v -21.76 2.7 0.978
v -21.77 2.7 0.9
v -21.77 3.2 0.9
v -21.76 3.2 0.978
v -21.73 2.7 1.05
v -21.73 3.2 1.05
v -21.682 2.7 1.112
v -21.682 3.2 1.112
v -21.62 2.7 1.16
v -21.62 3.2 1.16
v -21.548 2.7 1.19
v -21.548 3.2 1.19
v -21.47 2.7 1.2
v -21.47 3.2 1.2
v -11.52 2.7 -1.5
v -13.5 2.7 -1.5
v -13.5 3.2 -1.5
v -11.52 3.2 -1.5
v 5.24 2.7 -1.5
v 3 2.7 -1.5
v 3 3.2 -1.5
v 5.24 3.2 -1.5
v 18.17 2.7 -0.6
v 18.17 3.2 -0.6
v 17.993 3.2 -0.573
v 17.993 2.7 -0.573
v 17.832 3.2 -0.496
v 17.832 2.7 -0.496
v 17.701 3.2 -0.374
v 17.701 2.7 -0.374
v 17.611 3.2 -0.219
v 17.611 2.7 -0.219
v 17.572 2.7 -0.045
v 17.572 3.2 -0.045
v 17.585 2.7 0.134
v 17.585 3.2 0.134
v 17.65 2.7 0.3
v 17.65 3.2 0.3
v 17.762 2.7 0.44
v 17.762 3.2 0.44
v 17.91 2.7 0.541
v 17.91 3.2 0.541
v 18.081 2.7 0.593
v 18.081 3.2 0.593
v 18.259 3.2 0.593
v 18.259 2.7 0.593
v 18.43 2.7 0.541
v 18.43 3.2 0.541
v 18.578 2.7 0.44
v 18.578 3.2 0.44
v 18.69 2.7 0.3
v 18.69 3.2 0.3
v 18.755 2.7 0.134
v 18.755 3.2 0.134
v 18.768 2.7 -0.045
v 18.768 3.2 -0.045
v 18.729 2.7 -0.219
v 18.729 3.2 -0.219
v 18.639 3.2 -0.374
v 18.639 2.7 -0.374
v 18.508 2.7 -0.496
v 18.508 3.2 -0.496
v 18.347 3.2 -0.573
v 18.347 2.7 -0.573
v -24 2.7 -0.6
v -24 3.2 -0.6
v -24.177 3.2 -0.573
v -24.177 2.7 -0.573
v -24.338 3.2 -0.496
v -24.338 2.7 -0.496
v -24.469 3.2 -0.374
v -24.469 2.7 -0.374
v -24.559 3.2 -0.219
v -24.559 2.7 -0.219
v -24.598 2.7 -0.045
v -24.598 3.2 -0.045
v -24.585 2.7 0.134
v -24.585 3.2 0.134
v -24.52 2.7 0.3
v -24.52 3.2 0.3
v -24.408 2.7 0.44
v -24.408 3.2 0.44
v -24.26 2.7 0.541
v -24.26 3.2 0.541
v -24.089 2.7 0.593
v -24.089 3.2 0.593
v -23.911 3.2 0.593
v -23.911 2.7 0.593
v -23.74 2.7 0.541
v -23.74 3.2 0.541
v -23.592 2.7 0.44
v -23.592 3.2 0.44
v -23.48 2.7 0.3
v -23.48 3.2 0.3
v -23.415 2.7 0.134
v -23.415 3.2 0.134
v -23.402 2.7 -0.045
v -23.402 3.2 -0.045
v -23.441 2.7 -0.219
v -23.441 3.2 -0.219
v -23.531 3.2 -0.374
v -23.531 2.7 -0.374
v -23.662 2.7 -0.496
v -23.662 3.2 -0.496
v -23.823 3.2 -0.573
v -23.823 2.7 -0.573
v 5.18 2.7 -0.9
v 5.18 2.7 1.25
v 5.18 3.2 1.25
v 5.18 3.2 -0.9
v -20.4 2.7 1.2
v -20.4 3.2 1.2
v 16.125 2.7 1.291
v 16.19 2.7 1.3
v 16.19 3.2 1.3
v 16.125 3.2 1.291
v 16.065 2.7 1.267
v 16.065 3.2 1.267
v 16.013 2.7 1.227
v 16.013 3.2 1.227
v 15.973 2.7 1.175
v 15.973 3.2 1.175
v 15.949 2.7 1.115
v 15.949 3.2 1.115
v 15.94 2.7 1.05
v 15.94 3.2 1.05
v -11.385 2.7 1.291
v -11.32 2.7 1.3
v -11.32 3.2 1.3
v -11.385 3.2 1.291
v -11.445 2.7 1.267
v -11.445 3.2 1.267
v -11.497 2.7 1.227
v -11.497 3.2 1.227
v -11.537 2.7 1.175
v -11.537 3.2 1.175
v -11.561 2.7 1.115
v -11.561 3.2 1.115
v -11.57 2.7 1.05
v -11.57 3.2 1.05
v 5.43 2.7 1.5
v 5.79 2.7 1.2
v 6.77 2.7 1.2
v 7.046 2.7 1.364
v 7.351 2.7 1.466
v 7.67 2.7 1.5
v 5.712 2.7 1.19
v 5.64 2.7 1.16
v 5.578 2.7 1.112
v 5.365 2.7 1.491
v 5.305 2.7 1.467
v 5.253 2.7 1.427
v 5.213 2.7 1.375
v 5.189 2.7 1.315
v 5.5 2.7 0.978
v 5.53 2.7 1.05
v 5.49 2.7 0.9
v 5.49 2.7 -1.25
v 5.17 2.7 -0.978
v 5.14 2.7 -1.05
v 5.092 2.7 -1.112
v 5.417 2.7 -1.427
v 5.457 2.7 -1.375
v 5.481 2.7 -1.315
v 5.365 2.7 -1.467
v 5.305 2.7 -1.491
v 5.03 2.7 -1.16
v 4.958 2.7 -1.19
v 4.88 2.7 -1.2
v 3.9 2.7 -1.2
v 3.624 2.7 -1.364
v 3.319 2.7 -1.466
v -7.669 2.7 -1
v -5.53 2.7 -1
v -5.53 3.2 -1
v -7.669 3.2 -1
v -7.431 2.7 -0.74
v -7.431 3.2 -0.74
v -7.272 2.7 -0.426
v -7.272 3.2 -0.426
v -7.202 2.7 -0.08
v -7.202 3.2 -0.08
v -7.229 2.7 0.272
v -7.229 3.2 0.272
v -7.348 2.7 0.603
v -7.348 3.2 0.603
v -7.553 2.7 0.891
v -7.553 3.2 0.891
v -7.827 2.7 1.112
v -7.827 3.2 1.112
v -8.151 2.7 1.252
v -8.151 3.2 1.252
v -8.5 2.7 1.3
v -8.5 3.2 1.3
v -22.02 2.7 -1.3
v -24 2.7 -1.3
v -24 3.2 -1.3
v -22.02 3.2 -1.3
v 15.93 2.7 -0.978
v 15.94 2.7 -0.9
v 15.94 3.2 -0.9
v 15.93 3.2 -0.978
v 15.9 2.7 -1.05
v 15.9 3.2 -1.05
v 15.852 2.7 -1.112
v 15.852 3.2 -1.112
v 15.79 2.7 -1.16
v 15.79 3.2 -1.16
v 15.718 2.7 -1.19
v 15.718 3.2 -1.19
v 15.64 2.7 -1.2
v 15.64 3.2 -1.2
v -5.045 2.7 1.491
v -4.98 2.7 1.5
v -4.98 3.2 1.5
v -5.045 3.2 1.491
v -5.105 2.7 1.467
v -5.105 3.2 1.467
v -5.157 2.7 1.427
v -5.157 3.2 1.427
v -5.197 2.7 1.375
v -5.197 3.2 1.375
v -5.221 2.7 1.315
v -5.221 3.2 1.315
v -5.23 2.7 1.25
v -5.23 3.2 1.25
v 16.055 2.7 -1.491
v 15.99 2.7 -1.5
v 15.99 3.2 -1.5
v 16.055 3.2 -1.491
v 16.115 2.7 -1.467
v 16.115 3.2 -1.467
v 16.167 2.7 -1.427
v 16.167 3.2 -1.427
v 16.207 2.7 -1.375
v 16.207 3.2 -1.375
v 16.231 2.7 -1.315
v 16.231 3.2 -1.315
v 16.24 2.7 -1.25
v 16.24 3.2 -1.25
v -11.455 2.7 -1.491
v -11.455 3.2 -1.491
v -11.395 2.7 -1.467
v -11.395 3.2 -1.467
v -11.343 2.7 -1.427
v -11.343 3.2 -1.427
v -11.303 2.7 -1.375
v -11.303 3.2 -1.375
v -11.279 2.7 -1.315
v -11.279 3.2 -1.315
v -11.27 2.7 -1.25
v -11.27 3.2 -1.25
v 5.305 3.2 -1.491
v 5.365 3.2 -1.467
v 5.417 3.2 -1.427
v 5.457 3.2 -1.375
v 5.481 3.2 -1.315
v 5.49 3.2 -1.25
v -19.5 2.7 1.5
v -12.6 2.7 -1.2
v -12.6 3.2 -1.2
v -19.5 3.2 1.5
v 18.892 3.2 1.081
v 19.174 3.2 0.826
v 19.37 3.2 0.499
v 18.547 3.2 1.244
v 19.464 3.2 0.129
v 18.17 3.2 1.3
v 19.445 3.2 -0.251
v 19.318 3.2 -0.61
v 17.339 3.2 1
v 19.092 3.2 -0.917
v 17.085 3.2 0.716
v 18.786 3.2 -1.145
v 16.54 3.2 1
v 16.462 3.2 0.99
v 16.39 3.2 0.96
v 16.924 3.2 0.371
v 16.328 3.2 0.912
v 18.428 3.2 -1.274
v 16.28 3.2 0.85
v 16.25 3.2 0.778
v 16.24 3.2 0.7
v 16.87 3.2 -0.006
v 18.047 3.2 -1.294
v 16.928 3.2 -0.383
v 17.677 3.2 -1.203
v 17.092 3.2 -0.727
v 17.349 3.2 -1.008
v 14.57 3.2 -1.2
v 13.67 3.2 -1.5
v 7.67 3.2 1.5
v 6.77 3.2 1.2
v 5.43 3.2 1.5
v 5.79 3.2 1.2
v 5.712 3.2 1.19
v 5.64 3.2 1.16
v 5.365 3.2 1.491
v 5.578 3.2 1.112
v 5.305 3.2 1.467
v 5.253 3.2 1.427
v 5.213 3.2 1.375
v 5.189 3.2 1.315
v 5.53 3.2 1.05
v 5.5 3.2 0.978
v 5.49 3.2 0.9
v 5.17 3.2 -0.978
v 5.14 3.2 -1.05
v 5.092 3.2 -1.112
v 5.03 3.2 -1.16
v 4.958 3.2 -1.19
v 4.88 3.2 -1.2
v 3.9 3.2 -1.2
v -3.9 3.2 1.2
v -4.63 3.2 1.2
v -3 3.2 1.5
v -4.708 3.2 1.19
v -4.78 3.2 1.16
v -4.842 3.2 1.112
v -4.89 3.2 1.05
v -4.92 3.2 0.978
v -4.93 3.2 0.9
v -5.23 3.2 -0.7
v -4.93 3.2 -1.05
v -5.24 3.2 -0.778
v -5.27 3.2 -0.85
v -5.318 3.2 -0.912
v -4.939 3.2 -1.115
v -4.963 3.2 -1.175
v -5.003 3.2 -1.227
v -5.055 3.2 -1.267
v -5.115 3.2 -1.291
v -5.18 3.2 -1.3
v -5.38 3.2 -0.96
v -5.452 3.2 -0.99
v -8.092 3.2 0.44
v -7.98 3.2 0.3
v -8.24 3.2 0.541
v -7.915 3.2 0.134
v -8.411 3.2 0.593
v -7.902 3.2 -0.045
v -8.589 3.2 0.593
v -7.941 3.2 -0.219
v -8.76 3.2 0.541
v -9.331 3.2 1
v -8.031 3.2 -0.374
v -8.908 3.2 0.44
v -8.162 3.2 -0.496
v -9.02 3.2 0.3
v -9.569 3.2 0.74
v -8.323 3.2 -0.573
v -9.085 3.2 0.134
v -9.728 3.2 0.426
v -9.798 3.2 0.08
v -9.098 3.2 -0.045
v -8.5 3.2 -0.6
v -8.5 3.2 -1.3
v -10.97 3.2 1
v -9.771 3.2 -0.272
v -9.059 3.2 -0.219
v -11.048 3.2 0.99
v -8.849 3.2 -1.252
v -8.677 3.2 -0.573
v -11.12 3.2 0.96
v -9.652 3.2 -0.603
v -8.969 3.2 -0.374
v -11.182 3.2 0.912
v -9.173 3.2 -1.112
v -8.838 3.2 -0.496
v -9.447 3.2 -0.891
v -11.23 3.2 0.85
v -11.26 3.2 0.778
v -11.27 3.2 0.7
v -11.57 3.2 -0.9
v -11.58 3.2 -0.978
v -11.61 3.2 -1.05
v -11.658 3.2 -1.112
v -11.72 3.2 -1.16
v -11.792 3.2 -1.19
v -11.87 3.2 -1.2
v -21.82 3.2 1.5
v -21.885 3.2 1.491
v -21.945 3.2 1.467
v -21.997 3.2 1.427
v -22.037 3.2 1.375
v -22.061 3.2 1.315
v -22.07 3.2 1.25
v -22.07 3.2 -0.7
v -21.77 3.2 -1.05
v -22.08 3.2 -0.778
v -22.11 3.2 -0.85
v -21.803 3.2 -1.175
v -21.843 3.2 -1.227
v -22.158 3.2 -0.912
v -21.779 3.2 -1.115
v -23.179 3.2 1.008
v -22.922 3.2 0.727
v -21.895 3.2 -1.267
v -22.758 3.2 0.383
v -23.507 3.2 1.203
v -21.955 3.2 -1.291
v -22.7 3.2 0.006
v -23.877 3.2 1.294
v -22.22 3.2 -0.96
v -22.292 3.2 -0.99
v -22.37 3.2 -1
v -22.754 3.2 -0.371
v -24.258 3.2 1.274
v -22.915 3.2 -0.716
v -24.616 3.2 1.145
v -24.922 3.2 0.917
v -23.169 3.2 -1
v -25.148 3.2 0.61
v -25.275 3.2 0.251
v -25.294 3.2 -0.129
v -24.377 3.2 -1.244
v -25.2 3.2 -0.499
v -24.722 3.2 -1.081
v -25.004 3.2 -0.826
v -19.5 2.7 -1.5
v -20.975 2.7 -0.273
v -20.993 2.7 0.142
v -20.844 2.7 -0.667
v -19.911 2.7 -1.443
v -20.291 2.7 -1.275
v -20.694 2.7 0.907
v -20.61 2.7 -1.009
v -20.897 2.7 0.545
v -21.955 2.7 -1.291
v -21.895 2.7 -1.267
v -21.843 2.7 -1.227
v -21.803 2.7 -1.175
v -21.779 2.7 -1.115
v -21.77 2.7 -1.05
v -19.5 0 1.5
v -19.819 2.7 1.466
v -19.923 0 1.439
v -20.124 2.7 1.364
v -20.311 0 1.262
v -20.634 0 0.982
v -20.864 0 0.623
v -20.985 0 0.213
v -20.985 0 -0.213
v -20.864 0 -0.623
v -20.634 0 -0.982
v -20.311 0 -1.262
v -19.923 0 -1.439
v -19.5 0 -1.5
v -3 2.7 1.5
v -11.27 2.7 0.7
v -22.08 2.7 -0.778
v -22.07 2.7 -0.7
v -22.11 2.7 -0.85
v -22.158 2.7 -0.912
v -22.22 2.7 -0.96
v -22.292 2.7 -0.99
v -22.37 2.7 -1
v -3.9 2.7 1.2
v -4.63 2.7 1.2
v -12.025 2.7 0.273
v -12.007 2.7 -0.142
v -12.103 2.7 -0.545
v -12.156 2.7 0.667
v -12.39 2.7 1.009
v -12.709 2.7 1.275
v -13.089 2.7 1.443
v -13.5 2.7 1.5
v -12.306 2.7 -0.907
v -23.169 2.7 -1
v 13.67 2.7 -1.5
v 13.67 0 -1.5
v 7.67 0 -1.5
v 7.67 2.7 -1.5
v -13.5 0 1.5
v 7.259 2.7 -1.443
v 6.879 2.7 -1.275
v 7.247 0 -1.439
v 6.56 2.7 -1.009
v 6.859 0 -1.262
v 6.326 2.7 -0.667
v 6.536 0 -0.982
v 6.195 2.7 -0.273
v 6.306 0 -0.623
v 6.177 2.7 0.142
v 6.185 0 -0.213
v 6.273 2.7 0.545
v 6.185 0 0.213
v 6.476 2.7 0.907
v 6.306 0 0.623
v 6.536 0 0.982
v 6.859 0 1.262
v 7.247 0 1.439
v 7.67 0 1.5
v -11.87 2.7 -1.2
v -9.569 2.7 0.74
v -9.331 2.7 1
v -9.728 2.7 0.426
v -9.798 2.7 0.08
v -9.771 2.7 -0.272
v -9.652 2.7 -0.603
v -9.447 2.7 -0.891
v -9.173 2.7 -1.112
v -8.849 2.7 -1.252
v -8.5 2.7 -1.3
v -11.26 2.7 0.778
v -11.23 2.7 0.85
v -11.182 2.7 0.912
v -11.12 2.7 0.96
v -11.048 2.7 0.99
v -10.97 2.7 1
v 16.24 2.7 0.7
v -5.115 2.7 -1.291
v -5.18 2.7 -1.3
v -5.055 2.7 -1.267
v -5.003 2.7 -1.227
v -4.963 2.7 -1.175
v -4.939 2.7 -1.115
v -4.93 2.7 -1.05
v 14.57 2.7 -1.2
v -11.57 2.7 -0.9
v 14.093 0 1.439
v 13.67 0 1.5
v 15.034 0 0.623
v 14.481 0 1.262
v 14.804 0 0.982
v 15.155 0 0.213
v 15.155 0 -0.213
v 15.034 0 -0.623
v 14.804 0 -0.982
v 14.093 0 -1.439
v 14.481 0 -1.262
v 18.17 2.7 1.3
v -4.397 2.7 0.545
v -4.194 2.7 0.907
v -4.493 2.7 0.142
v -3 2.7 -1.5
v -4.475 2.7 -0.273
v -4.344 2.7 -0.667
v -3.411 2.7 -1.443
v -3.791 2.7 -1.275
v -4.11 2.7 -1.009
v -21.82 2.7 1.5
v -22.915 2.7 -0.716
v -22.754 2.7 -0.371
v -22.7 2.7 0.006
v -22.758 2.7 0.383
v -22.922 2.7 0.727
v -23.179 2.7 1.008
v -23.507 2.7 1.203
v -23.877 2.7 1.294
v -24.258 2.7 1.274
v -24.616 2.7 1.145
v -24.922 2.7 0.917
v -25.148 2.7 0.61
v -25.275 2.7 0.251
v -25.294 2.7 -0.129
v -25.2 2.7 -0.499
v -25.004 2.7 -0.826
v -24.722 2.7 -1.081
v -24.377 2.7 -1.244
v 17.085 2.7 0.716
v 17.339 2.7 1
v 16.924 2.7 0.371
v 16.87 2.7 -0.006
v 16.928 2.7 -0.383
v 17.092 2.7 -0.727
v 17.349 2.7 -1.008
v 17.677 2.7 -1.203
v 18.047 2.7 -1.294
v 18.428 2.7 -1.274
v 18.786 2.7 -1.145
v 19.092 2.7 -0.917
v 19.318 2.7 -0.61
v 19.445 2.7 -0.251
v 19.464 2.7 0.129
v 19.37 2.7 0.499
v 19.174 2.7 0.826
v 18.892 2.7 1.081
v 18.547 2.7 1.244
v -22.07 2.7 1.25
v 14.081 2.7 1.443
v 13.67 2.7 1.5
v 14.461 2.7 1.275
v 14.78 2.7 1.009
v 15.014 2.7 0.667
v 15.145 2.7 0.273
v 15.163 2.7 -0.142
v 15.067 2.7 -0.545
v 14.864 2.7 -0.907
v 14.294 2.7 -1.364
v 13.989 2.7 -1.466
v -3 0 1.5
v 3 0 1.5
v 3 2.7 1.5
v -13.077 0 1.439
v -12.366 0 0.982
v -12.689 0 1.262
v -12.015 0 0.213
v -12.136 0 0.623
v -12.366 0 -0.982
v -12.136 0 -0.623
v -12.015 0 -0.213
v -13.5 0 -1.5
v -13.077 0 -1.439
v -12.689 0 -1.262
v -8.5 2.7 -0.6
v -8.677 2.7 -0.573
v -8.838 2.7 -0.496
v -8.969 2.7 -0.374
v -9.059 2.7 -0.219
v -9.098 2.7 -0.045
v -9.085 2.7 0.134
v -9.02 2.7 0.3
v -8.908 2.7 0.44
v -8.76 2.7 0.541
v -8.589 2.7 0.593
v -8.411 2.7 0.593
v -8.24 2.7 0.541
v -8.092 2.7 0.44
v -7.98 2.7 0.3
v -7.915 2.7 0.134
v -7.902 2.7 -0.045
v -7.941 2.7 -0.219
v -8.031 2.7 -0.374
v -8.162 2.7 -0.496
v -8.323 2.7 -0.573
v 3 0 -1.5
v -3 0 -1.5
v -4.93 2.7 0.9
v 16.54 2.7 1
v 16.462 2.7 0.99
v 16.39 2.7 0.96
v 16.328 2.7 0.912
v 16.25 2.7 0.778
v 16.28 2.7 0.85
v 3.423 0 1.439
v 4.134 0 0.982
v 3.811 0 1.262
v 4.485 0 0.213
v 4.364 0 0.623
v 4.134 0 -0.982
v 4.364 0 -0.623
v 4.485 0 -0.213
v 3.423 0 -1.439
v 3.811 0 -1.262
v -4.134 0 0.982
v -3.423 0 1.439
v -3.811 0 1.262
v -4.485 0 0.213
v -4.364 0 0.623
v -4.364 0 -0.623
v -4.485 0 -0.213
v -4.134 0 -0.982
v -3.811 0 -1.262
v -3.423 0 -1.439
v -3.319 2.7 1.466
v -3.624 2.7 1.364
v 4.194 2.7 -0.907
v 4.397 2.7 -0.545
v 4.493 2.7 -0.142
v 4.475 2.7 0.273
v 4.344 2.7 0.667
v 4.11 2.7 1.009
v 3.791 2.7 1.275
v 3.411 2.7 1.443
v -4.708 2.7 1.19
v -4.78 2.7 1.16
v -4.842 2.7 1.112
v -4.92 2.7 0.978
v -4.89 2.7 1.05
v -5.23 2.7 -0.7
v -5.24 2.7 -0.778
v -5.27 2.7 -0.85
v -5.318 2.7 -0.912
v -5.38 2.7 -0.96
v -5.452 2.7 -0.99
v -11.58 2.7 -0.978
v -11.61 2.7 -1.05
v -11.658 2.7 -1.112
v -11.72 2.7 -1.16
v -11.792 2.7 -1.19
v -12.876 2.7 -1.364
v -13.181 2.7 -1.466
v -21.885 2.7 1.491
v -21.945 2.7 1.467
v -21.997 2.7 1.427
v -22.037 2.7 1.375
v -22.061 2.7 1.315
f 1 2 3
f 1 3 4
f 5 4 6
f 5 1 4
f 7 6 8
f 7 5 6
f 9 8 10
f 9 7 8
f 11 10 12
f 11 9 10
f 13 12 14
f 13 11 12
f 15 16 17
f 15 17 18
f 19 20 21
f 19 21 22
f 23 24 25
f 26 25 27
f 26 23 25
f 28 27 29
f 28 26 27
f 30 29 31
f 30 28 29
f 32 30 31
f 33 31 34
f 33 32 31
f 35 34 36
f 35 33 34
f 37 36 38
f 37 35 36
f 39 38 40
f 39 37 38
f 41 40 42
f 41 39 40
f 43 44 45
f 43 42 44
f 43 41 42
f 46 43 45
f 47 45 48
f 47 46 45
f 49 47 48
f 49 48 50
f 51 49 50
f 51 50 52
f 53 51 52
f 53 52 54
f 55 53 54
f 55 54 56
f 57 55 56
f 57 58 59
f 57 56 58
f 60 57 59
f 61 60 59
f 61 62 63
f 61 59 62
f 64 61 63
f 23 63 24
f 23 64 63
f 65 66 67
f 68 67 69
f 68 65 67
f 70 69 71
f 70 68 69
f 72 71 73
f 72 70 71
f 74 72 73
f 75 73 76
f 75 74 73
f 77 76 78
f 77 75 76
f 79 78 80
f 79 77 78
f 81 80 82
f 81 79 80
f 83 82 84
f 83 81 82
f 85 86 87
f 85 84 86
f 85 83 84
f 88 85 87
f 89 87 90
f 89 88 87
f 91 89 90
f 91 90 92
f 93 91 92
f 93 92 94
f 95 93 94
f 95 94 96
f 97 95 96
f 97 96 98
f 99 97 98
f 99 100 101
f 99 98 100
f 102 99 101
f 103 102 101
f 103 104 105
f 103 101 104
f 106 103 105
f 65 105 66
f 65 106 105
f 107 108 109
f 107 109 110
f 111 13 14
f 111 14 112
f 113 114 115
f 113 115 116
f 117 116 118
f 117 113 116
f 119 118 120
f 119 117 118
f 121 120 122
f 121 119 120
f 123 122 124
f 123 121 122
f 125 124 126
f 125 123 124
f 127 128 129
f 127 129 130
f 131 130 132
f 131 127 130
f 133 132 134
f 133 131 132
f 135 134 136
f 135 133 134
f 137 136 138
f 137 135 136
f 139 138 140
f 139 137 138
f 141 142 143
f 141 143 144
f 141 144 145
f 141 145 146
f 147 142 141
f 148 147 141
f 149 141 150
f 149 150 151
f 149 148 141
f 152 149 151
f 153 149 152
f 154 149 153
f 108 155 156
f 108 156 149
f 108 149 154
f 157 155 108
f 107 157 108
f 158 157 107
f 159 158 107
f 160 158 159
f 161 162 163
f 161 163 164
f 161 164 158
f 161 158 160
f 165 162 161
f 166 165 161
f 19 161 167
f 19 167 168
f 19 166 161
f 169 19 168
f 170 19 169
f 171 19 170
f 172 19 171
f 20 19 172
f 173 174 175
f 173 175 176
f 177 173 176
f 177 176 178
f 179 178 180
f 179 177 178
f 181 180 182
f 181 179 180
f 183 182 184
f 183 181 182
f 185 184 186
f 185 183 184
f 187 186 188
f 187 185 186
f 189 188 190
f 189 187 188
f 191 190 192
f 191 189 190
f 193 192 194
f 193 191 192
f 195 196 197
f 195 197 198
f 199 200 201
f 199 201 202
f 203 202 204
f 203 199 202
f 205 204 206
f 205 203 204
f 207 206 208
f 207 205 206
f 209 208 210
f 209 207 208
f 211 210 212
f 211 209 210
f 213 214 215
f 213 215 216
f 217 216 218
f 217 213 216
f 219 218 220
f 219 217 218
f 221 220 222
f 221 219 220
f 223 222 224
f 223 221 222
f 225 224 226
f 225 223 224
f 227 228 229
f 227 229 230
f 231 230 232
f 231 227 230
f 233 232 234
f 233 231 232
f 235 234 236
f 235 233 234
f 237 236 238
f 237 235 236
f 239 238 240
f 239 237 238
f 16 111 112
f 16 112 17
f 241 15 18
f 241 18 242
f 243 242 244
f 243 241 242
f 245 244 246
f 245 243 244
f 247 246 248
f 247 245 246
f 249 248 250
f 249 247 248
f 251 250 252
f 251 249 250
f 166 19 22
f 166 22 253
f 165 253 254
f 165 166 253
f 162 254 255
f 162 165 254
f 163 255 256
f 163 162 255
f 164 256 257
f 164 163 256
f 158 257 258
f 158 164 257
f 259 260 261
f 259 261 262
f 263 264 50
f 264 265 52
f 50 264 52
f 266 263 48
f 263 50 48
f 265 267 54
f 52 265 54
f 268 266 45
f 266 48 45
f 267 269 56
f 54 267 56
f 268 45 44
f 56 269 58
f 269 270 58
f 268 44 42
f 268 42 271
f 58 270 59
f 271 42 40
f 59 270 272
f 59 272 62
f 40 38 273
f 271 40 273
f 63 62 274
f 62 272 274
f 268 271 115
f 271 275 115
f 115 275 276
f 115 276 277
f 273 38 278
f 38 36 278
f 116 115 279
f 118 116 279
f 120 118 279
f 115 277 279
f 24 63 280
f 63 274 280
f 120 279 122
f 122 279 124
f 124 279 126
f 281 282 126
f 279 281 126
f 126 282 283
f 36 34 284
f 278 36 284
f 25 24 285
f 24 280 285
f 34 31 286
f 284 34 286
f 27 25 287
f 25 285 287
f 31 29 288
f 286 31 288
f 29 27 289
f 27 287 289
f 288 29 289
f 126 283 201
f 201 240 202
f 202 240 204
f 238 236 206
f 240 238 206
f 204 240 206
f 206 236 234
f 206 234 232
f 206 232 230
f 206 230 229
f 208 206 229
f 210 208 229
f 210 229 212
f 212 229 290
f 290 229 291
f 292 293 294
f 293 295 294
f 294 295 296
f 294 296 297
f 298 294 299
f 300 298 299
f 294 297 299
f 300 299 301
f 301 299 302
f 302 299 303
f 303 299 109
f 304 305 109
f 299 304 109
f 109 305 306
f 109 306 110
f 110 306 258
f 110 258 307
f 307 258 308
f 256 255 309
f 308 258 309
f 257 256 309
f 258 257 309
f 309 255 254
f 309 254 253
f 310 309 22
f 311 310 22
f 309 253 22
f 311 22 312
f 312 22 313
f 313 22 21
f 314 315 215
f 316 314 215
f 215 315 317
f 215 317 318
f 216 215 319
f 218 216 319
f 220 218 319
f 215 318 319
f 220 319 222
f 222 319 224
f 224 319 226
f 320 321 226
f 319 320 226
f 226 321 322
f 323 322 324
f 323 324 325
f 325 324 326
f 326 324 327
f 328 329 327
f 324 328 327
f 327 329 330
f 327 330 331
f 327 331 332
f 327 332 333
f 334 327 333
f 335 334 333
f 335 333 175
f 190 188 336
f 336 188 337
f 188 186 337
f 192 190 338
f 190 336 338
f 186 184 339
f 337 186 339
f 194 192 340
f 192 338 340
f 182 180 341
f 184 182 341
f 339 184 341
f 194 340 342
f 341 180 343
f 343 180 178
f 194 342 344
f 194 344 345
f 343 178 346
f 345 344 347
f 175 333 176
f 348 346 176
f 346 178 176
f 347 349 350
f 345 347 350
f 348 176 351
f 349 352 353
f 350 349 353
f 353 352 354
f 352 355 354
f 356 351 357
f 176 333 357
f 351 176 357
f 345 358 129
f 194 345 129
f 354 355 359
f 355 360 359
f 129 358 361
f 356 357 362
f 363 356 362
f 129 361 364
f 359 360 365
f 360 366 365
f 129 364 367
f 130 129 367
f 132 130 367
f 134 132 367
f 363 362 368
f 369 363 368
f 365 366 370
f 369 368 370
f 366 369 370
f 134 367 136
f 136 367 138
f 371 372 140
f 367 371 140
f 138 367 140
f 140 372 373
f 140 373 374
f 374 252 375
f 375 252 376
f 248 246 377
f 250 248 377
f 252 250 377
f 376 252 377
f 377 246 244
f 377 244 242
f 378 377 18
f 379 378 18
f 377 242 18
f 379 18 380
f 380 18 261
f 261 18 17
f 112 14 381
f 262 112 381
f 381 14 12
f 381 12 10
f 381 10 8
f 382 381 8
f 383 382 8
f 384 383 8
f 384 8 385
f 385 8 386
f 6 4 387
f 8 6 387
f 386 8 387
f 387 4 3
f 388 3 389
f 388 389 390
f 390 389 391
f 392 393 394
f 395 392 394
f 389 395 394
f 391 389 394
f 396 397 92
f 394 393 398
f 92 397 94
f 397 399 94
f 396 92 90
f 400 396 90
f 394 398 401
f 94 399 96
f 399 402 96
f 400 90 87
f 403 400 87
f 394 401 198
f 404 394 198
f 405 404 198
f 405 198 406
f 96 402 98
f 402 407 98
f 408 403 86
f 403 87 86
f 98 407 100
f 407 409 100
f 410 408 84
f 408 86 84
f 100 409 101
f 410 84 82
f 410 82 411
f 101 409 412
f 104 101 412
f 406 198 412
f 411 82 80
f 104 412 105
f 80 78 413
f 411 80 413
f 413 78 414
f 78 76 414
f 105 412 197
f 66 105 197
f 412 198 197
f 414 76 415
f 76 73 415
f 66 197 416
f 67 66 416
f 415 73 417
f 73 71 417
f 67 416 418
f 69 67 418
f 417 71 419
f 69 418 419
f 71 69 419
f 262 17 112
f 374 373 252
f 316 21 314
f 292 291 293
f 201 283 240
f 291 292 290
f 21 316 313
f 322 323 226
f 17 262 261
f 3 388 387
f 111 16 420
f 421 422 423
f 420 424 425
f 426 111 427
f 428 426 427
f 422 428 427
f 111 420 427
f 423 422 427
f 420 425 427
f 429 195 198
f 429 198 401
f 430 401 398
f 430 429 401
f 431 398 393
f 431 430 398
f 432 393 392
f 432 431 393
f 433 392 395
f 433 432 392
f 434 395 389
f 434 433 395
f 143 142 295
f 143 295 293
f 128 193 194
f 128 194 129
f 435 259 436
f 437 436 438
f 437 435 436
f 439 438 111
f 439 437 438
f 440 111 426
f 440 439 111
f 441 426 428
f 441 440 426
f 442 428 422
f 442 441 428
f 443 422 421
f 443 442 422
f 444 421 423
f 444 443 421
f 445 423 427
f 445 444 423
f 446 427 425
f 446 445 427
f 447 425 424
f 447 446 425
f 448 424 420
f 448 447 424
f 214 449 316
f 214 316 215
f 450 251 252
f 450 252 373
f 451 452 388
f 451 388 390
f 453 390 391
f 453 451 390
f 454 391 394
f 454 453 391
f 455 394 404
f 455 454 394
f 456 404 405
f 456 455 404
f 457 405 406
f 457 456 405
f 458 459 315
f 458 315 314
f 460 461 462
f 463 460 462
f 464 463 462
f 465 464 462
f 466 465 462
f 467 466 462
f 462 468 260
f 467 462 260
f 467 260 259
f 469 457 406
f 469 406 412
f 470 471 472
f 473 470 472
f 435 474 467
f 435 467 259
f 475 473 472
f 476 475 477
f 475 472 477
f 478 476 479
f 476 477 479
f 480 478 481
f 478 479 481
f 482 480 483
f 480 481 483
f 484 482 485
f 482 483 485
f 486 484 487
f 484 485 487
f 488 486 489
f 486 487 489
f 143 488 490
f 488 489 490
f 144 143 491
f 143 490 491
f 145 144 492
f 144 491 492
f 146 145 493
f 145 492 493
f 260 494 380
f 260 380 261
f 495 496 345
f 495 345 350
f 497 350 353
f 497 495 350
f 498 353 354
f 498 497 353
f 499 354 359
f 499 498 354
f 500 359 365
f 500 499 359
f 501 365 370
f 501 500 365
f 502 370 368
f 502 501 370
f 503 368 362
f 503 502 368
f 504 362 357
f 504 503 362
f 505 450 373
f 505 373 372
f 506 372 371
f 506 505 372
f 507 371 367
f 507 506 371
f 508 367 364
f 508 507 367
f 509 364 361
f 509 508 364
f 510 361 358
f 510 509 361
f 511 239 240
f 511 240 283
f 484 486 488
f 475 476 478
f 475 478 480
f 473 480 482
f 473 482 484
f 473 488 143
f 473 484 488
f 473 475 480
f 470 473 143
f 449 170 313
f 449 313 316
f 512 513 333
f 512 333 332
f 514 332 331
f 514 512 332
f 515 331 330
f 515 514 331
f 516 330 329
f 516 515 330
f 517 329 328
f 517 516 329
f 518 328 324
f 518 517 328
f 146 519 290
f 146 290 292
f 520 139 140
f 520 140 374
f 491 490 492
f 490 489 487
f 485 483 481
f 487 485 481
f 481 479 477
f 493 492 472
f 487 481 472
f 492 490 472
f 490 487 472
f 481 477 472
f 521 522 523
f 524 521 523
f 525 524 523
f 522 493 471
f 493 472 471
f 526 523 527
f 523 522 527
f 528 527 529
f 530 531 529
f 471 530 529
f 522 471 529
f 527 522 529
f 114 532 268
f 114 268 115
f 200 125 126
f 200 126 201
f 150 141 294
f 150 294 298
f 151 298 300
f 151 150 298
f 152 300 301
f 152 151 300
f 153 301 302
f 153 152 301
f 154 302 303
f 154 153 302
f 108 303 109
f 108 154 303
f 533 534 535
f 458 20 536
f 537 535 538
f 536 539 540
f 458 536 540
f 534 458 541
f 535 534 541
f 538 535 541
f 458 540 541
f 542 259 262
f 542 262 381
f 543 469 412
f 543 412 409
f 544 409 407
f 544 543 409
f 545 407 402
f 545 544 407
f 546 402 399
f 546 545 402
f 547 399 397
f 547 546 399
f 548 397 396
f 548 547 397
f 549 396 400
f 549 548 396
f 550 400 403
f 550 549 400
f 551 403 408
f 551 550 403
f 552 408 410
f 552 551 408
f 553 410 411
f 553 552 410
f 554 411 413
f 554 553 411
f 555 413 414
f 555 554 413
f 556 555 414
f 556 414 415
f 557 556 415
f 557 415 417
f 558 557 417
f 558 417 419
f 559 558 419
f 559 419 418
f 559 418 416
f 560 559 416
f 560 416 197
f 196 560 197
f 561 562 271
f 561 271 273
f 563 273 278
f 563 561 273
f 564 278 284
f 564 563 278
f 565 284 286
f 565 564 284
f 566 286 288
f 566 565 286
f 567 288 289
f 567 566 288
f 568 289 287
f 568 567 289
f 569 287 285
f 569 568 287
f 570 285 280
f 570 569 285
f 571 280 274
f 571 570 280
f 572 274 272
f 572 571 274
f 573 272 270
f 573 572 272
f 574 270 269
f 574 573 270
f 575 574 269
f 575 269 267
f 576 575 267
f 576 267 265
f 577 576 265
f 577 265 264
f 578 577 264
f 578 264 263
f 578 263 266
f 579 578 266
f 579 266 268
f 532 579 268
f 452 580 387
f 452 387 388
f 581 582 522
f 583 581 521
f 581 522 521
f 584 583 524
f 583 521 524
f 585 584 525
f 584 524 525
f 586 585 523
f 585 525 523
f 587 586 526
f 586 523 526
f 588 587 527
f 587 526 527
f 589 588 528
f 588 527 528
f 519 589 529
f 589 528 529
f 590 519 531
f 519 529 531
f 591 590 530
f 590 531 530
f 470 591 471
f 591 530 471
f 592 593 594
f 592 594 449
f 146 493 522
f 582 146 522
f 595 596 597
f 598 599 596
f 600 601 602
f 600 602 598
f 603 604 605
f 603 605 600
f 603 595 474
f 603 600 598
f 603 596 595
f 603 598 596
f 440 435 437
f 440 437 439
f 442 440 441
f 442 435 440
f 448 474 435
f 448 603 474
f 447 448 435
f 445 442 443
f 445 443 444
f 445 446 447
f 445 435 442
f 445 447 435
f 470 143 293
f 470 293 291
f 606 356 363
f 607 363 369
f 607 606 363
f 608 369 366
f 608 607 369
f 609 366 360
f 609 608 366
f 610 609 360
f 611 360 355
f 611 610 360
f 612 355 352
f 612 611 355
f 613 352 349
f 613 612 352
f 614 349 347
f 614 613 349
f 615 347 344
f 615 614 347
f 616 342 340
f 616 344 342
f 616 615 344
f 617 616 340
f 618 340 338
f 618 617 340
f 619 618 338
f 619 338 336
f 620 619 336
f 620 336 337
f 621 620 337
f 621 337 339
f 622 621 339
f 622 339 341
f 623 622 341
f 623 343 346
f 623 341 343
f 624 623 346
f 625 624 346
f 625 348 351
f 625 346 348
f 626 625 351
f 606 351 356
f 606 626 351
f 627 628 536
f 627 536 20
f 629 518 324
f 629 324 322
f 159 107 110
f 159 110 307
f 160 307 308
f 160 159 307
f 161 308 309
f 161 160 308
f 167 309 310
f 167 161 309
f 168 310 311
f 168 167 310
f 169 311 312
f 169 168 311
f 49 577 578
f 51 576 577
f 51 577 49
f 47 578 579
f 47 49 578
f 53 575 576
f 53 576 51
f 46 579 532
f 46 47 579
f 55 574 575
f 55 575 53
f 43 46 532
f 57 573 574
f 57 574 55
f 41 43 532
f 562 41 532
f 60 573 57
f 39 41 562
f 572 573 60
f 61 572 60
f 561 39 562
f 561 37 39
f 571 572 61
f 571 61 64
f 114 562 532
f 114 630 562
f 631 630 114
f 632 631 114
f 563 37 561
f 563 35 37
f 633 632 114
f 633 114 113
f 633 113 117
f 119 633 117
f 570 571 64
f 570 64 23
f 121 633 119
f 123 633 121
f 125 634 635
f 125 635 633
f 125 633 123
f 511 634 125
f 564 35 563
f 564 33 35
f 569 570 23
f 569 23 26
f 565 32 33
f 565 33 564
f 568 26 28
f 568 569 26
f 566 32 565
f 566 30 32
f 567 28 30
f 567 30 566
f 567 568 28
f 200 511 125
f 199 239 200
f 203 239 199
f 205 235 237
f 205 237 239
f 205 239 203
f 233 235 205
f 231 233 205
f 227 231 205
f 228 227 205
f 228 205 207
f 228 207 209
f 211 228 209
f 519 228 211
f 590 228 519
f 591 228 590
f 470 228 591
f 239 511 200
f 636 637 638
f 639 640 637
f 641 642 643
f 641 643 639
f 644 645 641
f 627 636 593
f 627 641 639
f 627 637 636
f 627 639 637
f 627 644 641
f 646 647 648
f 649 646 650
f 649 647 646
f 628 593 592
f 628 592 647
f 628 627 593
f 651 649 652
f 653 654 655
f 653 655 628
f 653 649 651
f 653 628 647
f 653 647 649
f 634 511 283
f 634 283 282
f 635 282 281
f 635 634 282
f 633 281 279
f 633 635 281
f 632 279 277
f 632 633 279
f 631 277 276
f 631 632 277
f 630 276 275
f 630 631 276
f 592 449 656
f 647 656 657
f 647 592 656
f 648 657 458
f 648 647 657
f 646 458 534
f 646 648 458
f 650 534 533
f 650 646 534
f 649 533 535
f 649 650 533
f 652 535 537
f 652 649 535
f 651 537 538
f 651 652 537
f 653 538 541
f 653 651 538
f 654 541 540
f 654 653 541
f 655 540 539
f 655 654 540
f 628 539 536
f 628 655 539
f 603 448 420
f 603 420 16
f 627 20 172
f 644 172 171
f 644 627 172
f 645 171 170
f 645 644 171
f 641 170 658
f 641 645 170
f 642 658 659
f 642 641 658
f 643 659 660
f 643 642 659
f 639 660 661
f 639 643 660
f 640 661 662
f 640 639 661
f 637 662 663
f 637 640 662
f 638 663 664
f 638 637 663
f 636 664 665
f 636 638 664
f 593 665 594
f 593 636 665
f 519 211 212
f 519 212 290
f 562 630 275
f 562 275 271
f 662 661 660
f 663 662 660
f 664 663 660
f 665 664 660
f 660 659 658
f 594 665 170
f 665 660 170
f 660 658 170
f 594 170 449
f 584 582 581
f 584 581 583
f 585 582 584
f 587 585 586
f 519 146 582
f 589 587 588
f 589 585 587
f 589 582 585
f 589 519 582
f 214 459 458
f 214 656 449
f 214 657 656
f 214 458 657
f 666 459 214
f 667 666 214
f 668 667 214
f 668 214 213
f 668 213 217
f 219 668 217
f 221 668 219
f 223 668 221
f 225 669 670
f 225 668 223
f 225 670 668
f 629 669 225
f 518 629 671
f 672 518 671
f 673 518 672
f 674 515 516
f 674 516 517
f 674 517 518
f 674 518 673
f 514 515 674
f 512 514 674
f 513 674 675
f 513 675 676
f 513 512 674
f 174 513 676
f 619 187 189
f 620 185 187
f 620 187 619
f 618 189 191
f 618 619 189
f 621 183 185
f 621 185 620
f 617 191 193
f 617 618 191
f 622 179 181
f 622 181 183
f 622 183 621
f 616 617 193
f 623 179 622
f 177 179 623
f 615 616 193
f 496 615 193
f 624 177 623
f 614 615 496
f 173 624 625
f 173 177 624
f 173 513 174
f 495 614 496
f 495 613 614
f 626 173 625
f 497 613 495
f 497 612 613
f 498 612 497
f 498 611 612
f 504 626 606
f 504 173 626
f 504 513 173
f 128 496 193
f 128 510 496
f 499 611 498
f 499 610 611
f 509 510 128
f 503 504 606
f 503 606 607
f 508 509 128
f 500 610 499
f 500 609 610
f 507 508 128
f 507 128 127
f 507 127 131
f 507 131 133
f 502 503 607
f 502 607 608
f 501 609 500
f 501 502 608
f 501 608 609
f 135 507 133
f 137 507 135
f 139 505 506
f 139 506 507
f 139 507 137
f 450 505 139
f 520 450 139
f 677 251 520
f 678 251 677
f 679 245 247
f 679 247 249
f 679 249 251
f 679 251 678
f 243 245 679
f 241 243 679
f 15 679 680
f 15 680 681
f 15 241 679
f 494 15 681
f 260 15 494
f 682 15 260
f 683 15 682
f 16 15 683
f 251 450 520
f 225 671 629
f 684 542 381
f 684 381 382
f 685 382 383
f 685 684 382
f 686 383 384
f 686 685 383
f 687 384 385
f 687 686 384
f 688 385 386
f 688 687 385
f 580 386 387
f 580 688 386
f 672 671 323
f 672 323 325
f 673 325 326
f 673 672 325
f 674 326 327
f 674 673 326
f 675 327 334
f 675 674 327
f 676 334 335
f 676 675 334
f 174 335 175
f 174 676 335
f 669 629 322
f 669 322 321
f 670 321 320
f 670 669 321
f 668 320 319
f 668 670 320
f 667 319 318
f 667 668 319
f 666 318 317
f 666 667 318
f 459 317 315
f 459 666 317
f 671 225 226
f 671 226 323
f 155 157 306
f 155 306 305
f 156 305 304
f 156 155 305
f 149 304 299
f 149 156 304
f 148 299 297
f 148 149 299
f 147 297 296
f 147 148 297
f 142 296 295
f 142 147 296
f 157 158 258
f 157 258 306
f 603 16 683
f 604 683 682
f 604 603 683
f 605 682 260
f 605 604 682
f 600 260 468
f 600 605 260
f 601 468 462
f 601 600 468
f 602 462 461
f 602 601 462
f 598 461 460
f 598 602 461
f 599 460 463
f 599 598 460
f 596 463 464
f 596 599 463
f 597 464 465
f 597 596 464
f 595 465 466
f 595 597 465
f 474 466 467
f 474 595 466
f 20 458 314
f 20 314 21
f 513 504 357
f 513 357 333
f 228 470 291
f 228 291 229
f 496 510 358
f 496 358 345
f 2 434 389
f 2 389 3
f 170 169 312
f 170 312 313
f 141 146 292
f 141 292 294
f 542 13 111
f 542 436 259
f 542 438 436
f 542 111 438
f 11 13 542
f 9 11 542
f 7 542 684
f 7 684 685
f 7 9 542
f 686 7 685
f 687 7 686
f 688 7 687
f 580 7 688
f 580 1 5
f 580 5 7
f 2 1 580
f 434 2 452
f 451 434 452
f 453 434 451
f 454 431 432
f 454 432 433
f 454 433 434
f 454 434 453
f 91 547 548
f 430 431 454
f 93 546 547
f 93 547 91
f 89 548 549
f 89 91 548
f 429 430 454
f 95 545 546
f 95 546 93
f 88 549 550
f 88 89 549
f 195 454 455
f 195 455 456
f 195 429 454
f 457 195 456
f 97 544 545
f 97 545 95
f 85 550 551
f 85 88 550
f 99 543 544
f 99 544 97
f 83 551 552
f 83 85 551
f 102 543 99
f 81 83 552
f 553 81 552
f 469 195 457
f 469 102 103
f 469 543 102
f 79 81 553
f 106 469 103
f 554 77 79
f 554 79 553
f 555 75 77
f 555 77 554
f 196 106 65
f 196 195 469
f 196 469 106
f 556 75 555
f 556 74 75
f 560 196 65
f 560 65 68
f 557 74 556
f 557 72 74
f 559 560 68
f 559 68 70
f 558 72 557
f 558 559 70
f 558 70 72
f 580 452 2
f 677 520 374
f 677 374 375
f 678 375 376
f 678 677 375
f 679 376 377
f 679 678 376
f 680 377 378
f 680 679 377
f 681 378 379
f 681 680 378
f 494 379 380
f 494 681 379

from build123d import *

# Parameters (mm, degrees)
EXTRUDE_1_DEPTH     = 2.7
EXTRUDE_1_2_DEPTH   = 2.7
EXTRUDE_1_3_DEPTH   = 2.7
EXTRUDE_2_DEPTH     = 0.5
CUT_EXTRUDE_1_REACH = 27.488
SKETCH_2_3_R        = 0.6


with BuildPart() as part:
    # 草图1 → 凸台-拉伸1 (new body)
    with BuildSketch(Plane(origin=(0, 0, 0), x_dir=(1, 0, 0), z_dir=(0, 1, 0))):
        with BuildLine():
            Line((3, 1.5), (-3, 1.5))
            ThreePointArc((-3, 1.5), (-4.5, 0), (-3, -1.5))
            Line((-3, -1.5), (3, -1.5))
            ThreePointArc((3, -1.5), (4.5, 0), (3, 1.5))
        make_face()
    extrude(amount=EXTRUDE_1_DEPTH)



with BuildPart() as body_2:
    # 草图1 → Extrude 1 2 (new body)
    with BuildSketch(Plane(origin=(0, 0, 0), x_dir=(1, 0, 0), z_dir=(0, 1, 0))):
        with BuildLine():
            Line((-13.5, 1.5), (-19.5, 1.5))
            ThreePointArc((-19.5, 1.5), (-21, 0), (-19.5, -1.5))
            Line((-19.5, -1.5), (-13.5, -1.5))
            ThreePointArc((-13.5, -1.5), (-12, 0), (-13.5, 1.5))
        make_face()
    extrude(amount=EXTRUDE_1_2_DEPTH)


with BuildPart() as body_3:
    # 草图1 → Extrude 1 3 (new body)
    with BuildSketch(Plane(origin=(0, 0, 0), x_dir=(1, 0, 0), z_dir=(0, 1, 0))):
        with BuildLine():
            Line((13.67, 1.5), (7.67, 1.5))
            ThreePointArc((7.67, 1.5), (6.17, 0), (7.67, -1.5))
            Line((7.67, -1.5), (13.67, -1.5))
            ThreePointArc((13.67, -1.5), (15.17, 0), (13.67, 1.5))
        make_face()
    extrude(amount=EXTRUDE_1_3_DEPTH)


with BuildPart() as part_1:
    add(part.part)

    add(body_2.part)  # 凸台-拉伸2 merges body 2

    add(body_3.part)  # 凸台-拉伸2 merges body 3
    # 草图2 → 凸台-拉伸2 (add)
    with BuildSketch(Plane(origin=(0, 2.7, 0), x_dir=(1, 0, 0), z_dir=(0, 1, 0))):
        with BuildLine():
            Line((-24, 1.3), (-22.02, 1.3))
            ThreePointArc((-22.02, 1.3), (-21.843223305, 1.226776695), (-21.77, 1.05))
            Line((-21.77, 1.05), (-21.77, -0.9))
            ThreePointArc((-21.77, -0.9), (-21.682132034, -1.112132034), (-21.47, -1.2))
            Line((-21.47, -1.2), (-20.4, -1.2))
            Line((-20.4, -1.2), (-13.5, 1.5))
            Line((-13.5, 1.5), (-11.52, 1.5))
            ThreePointArc((-11.52, 1.5), (-11.343223305, 1.426776695), (-11.27, 1.25))
            Line((-11.27, 1.25), (-11.27, -0.7))
            ThreePointArc((-11.27, -0.7), (-11.182132034, -0.912132034), (-10.97, -1))
            Line((-10.97, -1), (-9.330662386, -1))
            ThreePointArc((-9.330662386, -1), (-9.722701926, 0.441588043), (-8.5, 1.3))
            Line((-8.5, 1.3), (-5.18, 1.3))
            ThreePointArc((-5.18, 1.3), (-5.003223305, 1.226776695), (-4.93, 1.05))
            Line((-4.93, 1.05), (-4.93, -0.9))
            ThreePointArc((-4.93, -0.9), (-4.842132034, -1.112132034), (-4.63, -1.2))
            Line((-4.63, -1.2), (-3.9, -1.2))
            Line((-3.9, -1.2), (3, 1.5))
            Line((3, 1.5), (5.24, 1.5))
            ThreePointArc((5.24, 1.5), (5.416776695, 1.426776695), (5.49, 1.25))
            Line((5.49, 1.25), (5.49, -0.9))
            ThreePointArc((5.49, -0.9), (5.577867966, -1.112132034), (5.79, -1.2))
            Line((5.79, -1.2), (6.77, -1.2))
            Line((6.77, -1.2), (13.67, 1.5))
            Line((13.67, 1.5), (15.99, 1.5))
            ThreePointArc((15.99, 1.5), (16.166776695, 1.426776695), (16.24, 1.25))
            Line((16.24, 1.25), (16.24, -0.7))
            ThreePointArc((16.24, -0.7), (16.327867966, -0.912132034), (16.54, -1))
            Line((16.54, -1), (17.339337614, -1))
            ThreePointArc((17.339337614, -1), (18.611588043, 1.222701926), (18.17, -1.3))
            Line((18.17, -1.3), (16.19, -1.3))
            ThreePointArc((16.19, -1.3), (16.013223305, -1.226776695), (15.94, -1.05))
            Line((15.94, -1.05), (15.94, 0.9))
            ThreePointArc((15.94, 0.9), (15.852132034, 1.112132034), (15.64, 1.2))
            Line((15.64, 1.2), (14.57, 1.2))
            Line((14.57, 1.2), (7.67, -1.5))
            Line((7.67, -1.5), (5.43, -1.5))
            ThreePointArc((5.43, -1.5), (5.253223305, -1.426776695), (5.18, -1.25))
            Line((5.18, -1.25), (5.18, 0.9))
            ThreePointArc((5.18, 0.9), (5.092132034, 1.112132034), (4.88, 1.2))
            Line((4.88, 1.2), (3.9, 1.2))
            Line((3.9, 1.2), (-3, -1.5))
            Line((-3, -1.5), (-4.98, -1.5))
            ThreePointArc((-4.98, -1.5), (-5.156776695, -1.426776695), (-5.23, -1.25))
            Line((-5.23, -1.25), (-5.23, 0.7))
            ThreePointArc((-5.23, 0.7), (-5.317867966, 0.912132034), (-5.53, 1))
            Line((-5.53, 1), (-7.669337614, 1))
            ThreePointArc((-7.669337614, 1), (-7.277298074, -0.441588043), (-8.5, -1.3))
            Line((-8.5, -1.3), (-11.32, -1.3))
            ThreePointArc((-11.32, -1.3), (-11.496776695, -1.226776695), (-11.57, -1.05))
            Line((-11.57, -1.05), (-11.57, 0.9))
            ThreePointArc((-11.57, 0.9), (-11.657867966, 1.112132034), (-11.87, 1.2))
            Line((-11.87, 1.2), (-12.6, 1.2))
            Line((-12.6, 1.2), (-19.5, -1.5))
            Line((-19.5, -1.5), (-21.82, -1.5))
            ThreePointArc((-21.82, -1.5), (-21.996776695, -1.426776695), (-22.07, -1.25))
            Line((-22.07, -1.25), (-22.07, 0.7))
            ThreePointArc((-22.07, 0.7), (-22.157867966, 0.912132034), (-22.37, 1))
            Line((-22.37, 1), (-23.169337614, 1))
            ThreePointArc((-23.169337614, 1), (-24.441588043, -1.222701926), (-24, 1.3))
        make_face()
    extrude(amount=EXTRUDE_2_DEPTH)

    # 草图2<3> → 切除-拉伸1 (cut, up to next)
    with BuildSketch(Plane(origin=(0, 2.7, 0), x_dir=(1, 0, 0), z_dir=(0, 1, 0)), mode=Mode.PRIVATE) as cut_extrude_1_sk1:
        with Locations((-24, 0)):
            Circle(SKETCH_2_3_R)
    cut_extrude_1_tool1 = extrude(cut_extrude_1_sk1.sketch, amount=CUT_EXTRUDE_1_REACH, mode=Mode.PRIVATE) & part_1.part
    # 草图2<3> → 切除-拉伸1 (cut, up to next)
    with BuildSketch(Plane(origin=(0, 2.7, 0), x_dir=(1, 0, 0), z_dir=(0, 1, 0)), mode=Mode.PRIVATE) as cut_extrude_1_sk2:
        with Locations((-8.5, 0)):
            Circle(SKETCH_2_3_R)
    cut_extrude_1_tool2 = extrude(cut_extrude_1_sk2.sketch, amount=CUT_EXTRUDE_1_REACH, mode=Mode.PRIVATE) & part_1.part
    # 草图2<3> → 切除-拉伸1 (cut, up to next)
    with BuildSketch(Plane(origin=(0, 2.7, 0), x_dir=(1, 0, 0), z_dir=(0, 1, 0)), mode=Mode.PRIVATE) as cut_extrude_1_sk3:
        with Locations((18.17, 0)):
            Circle(SKETCH_2_3_R)
    cut_extrude_1_tool3 = extrude(cut_extrude_1_sk3.sketch, amount=CUT_EXTRUDE_1_REACH, mode=Mode.PRIVATE) & part_1.part
    add(cut_extrude_1_tool1.solids().sort_by_distance((-24, 2.7, 0))[0], mode=Mode.SUBTRACT)
    add(cut_extrude_1_tool2.solids().sort_by_distance((-8.5, 2.7, 0))[0], mode=Mode.SUBTRACT)
    add(cut_extrude_1_tool3.solids().sort_by_distance((18.17, 2.7, 0))[0], mode=Mode.SUBTRACT)


solid = part_1.part
